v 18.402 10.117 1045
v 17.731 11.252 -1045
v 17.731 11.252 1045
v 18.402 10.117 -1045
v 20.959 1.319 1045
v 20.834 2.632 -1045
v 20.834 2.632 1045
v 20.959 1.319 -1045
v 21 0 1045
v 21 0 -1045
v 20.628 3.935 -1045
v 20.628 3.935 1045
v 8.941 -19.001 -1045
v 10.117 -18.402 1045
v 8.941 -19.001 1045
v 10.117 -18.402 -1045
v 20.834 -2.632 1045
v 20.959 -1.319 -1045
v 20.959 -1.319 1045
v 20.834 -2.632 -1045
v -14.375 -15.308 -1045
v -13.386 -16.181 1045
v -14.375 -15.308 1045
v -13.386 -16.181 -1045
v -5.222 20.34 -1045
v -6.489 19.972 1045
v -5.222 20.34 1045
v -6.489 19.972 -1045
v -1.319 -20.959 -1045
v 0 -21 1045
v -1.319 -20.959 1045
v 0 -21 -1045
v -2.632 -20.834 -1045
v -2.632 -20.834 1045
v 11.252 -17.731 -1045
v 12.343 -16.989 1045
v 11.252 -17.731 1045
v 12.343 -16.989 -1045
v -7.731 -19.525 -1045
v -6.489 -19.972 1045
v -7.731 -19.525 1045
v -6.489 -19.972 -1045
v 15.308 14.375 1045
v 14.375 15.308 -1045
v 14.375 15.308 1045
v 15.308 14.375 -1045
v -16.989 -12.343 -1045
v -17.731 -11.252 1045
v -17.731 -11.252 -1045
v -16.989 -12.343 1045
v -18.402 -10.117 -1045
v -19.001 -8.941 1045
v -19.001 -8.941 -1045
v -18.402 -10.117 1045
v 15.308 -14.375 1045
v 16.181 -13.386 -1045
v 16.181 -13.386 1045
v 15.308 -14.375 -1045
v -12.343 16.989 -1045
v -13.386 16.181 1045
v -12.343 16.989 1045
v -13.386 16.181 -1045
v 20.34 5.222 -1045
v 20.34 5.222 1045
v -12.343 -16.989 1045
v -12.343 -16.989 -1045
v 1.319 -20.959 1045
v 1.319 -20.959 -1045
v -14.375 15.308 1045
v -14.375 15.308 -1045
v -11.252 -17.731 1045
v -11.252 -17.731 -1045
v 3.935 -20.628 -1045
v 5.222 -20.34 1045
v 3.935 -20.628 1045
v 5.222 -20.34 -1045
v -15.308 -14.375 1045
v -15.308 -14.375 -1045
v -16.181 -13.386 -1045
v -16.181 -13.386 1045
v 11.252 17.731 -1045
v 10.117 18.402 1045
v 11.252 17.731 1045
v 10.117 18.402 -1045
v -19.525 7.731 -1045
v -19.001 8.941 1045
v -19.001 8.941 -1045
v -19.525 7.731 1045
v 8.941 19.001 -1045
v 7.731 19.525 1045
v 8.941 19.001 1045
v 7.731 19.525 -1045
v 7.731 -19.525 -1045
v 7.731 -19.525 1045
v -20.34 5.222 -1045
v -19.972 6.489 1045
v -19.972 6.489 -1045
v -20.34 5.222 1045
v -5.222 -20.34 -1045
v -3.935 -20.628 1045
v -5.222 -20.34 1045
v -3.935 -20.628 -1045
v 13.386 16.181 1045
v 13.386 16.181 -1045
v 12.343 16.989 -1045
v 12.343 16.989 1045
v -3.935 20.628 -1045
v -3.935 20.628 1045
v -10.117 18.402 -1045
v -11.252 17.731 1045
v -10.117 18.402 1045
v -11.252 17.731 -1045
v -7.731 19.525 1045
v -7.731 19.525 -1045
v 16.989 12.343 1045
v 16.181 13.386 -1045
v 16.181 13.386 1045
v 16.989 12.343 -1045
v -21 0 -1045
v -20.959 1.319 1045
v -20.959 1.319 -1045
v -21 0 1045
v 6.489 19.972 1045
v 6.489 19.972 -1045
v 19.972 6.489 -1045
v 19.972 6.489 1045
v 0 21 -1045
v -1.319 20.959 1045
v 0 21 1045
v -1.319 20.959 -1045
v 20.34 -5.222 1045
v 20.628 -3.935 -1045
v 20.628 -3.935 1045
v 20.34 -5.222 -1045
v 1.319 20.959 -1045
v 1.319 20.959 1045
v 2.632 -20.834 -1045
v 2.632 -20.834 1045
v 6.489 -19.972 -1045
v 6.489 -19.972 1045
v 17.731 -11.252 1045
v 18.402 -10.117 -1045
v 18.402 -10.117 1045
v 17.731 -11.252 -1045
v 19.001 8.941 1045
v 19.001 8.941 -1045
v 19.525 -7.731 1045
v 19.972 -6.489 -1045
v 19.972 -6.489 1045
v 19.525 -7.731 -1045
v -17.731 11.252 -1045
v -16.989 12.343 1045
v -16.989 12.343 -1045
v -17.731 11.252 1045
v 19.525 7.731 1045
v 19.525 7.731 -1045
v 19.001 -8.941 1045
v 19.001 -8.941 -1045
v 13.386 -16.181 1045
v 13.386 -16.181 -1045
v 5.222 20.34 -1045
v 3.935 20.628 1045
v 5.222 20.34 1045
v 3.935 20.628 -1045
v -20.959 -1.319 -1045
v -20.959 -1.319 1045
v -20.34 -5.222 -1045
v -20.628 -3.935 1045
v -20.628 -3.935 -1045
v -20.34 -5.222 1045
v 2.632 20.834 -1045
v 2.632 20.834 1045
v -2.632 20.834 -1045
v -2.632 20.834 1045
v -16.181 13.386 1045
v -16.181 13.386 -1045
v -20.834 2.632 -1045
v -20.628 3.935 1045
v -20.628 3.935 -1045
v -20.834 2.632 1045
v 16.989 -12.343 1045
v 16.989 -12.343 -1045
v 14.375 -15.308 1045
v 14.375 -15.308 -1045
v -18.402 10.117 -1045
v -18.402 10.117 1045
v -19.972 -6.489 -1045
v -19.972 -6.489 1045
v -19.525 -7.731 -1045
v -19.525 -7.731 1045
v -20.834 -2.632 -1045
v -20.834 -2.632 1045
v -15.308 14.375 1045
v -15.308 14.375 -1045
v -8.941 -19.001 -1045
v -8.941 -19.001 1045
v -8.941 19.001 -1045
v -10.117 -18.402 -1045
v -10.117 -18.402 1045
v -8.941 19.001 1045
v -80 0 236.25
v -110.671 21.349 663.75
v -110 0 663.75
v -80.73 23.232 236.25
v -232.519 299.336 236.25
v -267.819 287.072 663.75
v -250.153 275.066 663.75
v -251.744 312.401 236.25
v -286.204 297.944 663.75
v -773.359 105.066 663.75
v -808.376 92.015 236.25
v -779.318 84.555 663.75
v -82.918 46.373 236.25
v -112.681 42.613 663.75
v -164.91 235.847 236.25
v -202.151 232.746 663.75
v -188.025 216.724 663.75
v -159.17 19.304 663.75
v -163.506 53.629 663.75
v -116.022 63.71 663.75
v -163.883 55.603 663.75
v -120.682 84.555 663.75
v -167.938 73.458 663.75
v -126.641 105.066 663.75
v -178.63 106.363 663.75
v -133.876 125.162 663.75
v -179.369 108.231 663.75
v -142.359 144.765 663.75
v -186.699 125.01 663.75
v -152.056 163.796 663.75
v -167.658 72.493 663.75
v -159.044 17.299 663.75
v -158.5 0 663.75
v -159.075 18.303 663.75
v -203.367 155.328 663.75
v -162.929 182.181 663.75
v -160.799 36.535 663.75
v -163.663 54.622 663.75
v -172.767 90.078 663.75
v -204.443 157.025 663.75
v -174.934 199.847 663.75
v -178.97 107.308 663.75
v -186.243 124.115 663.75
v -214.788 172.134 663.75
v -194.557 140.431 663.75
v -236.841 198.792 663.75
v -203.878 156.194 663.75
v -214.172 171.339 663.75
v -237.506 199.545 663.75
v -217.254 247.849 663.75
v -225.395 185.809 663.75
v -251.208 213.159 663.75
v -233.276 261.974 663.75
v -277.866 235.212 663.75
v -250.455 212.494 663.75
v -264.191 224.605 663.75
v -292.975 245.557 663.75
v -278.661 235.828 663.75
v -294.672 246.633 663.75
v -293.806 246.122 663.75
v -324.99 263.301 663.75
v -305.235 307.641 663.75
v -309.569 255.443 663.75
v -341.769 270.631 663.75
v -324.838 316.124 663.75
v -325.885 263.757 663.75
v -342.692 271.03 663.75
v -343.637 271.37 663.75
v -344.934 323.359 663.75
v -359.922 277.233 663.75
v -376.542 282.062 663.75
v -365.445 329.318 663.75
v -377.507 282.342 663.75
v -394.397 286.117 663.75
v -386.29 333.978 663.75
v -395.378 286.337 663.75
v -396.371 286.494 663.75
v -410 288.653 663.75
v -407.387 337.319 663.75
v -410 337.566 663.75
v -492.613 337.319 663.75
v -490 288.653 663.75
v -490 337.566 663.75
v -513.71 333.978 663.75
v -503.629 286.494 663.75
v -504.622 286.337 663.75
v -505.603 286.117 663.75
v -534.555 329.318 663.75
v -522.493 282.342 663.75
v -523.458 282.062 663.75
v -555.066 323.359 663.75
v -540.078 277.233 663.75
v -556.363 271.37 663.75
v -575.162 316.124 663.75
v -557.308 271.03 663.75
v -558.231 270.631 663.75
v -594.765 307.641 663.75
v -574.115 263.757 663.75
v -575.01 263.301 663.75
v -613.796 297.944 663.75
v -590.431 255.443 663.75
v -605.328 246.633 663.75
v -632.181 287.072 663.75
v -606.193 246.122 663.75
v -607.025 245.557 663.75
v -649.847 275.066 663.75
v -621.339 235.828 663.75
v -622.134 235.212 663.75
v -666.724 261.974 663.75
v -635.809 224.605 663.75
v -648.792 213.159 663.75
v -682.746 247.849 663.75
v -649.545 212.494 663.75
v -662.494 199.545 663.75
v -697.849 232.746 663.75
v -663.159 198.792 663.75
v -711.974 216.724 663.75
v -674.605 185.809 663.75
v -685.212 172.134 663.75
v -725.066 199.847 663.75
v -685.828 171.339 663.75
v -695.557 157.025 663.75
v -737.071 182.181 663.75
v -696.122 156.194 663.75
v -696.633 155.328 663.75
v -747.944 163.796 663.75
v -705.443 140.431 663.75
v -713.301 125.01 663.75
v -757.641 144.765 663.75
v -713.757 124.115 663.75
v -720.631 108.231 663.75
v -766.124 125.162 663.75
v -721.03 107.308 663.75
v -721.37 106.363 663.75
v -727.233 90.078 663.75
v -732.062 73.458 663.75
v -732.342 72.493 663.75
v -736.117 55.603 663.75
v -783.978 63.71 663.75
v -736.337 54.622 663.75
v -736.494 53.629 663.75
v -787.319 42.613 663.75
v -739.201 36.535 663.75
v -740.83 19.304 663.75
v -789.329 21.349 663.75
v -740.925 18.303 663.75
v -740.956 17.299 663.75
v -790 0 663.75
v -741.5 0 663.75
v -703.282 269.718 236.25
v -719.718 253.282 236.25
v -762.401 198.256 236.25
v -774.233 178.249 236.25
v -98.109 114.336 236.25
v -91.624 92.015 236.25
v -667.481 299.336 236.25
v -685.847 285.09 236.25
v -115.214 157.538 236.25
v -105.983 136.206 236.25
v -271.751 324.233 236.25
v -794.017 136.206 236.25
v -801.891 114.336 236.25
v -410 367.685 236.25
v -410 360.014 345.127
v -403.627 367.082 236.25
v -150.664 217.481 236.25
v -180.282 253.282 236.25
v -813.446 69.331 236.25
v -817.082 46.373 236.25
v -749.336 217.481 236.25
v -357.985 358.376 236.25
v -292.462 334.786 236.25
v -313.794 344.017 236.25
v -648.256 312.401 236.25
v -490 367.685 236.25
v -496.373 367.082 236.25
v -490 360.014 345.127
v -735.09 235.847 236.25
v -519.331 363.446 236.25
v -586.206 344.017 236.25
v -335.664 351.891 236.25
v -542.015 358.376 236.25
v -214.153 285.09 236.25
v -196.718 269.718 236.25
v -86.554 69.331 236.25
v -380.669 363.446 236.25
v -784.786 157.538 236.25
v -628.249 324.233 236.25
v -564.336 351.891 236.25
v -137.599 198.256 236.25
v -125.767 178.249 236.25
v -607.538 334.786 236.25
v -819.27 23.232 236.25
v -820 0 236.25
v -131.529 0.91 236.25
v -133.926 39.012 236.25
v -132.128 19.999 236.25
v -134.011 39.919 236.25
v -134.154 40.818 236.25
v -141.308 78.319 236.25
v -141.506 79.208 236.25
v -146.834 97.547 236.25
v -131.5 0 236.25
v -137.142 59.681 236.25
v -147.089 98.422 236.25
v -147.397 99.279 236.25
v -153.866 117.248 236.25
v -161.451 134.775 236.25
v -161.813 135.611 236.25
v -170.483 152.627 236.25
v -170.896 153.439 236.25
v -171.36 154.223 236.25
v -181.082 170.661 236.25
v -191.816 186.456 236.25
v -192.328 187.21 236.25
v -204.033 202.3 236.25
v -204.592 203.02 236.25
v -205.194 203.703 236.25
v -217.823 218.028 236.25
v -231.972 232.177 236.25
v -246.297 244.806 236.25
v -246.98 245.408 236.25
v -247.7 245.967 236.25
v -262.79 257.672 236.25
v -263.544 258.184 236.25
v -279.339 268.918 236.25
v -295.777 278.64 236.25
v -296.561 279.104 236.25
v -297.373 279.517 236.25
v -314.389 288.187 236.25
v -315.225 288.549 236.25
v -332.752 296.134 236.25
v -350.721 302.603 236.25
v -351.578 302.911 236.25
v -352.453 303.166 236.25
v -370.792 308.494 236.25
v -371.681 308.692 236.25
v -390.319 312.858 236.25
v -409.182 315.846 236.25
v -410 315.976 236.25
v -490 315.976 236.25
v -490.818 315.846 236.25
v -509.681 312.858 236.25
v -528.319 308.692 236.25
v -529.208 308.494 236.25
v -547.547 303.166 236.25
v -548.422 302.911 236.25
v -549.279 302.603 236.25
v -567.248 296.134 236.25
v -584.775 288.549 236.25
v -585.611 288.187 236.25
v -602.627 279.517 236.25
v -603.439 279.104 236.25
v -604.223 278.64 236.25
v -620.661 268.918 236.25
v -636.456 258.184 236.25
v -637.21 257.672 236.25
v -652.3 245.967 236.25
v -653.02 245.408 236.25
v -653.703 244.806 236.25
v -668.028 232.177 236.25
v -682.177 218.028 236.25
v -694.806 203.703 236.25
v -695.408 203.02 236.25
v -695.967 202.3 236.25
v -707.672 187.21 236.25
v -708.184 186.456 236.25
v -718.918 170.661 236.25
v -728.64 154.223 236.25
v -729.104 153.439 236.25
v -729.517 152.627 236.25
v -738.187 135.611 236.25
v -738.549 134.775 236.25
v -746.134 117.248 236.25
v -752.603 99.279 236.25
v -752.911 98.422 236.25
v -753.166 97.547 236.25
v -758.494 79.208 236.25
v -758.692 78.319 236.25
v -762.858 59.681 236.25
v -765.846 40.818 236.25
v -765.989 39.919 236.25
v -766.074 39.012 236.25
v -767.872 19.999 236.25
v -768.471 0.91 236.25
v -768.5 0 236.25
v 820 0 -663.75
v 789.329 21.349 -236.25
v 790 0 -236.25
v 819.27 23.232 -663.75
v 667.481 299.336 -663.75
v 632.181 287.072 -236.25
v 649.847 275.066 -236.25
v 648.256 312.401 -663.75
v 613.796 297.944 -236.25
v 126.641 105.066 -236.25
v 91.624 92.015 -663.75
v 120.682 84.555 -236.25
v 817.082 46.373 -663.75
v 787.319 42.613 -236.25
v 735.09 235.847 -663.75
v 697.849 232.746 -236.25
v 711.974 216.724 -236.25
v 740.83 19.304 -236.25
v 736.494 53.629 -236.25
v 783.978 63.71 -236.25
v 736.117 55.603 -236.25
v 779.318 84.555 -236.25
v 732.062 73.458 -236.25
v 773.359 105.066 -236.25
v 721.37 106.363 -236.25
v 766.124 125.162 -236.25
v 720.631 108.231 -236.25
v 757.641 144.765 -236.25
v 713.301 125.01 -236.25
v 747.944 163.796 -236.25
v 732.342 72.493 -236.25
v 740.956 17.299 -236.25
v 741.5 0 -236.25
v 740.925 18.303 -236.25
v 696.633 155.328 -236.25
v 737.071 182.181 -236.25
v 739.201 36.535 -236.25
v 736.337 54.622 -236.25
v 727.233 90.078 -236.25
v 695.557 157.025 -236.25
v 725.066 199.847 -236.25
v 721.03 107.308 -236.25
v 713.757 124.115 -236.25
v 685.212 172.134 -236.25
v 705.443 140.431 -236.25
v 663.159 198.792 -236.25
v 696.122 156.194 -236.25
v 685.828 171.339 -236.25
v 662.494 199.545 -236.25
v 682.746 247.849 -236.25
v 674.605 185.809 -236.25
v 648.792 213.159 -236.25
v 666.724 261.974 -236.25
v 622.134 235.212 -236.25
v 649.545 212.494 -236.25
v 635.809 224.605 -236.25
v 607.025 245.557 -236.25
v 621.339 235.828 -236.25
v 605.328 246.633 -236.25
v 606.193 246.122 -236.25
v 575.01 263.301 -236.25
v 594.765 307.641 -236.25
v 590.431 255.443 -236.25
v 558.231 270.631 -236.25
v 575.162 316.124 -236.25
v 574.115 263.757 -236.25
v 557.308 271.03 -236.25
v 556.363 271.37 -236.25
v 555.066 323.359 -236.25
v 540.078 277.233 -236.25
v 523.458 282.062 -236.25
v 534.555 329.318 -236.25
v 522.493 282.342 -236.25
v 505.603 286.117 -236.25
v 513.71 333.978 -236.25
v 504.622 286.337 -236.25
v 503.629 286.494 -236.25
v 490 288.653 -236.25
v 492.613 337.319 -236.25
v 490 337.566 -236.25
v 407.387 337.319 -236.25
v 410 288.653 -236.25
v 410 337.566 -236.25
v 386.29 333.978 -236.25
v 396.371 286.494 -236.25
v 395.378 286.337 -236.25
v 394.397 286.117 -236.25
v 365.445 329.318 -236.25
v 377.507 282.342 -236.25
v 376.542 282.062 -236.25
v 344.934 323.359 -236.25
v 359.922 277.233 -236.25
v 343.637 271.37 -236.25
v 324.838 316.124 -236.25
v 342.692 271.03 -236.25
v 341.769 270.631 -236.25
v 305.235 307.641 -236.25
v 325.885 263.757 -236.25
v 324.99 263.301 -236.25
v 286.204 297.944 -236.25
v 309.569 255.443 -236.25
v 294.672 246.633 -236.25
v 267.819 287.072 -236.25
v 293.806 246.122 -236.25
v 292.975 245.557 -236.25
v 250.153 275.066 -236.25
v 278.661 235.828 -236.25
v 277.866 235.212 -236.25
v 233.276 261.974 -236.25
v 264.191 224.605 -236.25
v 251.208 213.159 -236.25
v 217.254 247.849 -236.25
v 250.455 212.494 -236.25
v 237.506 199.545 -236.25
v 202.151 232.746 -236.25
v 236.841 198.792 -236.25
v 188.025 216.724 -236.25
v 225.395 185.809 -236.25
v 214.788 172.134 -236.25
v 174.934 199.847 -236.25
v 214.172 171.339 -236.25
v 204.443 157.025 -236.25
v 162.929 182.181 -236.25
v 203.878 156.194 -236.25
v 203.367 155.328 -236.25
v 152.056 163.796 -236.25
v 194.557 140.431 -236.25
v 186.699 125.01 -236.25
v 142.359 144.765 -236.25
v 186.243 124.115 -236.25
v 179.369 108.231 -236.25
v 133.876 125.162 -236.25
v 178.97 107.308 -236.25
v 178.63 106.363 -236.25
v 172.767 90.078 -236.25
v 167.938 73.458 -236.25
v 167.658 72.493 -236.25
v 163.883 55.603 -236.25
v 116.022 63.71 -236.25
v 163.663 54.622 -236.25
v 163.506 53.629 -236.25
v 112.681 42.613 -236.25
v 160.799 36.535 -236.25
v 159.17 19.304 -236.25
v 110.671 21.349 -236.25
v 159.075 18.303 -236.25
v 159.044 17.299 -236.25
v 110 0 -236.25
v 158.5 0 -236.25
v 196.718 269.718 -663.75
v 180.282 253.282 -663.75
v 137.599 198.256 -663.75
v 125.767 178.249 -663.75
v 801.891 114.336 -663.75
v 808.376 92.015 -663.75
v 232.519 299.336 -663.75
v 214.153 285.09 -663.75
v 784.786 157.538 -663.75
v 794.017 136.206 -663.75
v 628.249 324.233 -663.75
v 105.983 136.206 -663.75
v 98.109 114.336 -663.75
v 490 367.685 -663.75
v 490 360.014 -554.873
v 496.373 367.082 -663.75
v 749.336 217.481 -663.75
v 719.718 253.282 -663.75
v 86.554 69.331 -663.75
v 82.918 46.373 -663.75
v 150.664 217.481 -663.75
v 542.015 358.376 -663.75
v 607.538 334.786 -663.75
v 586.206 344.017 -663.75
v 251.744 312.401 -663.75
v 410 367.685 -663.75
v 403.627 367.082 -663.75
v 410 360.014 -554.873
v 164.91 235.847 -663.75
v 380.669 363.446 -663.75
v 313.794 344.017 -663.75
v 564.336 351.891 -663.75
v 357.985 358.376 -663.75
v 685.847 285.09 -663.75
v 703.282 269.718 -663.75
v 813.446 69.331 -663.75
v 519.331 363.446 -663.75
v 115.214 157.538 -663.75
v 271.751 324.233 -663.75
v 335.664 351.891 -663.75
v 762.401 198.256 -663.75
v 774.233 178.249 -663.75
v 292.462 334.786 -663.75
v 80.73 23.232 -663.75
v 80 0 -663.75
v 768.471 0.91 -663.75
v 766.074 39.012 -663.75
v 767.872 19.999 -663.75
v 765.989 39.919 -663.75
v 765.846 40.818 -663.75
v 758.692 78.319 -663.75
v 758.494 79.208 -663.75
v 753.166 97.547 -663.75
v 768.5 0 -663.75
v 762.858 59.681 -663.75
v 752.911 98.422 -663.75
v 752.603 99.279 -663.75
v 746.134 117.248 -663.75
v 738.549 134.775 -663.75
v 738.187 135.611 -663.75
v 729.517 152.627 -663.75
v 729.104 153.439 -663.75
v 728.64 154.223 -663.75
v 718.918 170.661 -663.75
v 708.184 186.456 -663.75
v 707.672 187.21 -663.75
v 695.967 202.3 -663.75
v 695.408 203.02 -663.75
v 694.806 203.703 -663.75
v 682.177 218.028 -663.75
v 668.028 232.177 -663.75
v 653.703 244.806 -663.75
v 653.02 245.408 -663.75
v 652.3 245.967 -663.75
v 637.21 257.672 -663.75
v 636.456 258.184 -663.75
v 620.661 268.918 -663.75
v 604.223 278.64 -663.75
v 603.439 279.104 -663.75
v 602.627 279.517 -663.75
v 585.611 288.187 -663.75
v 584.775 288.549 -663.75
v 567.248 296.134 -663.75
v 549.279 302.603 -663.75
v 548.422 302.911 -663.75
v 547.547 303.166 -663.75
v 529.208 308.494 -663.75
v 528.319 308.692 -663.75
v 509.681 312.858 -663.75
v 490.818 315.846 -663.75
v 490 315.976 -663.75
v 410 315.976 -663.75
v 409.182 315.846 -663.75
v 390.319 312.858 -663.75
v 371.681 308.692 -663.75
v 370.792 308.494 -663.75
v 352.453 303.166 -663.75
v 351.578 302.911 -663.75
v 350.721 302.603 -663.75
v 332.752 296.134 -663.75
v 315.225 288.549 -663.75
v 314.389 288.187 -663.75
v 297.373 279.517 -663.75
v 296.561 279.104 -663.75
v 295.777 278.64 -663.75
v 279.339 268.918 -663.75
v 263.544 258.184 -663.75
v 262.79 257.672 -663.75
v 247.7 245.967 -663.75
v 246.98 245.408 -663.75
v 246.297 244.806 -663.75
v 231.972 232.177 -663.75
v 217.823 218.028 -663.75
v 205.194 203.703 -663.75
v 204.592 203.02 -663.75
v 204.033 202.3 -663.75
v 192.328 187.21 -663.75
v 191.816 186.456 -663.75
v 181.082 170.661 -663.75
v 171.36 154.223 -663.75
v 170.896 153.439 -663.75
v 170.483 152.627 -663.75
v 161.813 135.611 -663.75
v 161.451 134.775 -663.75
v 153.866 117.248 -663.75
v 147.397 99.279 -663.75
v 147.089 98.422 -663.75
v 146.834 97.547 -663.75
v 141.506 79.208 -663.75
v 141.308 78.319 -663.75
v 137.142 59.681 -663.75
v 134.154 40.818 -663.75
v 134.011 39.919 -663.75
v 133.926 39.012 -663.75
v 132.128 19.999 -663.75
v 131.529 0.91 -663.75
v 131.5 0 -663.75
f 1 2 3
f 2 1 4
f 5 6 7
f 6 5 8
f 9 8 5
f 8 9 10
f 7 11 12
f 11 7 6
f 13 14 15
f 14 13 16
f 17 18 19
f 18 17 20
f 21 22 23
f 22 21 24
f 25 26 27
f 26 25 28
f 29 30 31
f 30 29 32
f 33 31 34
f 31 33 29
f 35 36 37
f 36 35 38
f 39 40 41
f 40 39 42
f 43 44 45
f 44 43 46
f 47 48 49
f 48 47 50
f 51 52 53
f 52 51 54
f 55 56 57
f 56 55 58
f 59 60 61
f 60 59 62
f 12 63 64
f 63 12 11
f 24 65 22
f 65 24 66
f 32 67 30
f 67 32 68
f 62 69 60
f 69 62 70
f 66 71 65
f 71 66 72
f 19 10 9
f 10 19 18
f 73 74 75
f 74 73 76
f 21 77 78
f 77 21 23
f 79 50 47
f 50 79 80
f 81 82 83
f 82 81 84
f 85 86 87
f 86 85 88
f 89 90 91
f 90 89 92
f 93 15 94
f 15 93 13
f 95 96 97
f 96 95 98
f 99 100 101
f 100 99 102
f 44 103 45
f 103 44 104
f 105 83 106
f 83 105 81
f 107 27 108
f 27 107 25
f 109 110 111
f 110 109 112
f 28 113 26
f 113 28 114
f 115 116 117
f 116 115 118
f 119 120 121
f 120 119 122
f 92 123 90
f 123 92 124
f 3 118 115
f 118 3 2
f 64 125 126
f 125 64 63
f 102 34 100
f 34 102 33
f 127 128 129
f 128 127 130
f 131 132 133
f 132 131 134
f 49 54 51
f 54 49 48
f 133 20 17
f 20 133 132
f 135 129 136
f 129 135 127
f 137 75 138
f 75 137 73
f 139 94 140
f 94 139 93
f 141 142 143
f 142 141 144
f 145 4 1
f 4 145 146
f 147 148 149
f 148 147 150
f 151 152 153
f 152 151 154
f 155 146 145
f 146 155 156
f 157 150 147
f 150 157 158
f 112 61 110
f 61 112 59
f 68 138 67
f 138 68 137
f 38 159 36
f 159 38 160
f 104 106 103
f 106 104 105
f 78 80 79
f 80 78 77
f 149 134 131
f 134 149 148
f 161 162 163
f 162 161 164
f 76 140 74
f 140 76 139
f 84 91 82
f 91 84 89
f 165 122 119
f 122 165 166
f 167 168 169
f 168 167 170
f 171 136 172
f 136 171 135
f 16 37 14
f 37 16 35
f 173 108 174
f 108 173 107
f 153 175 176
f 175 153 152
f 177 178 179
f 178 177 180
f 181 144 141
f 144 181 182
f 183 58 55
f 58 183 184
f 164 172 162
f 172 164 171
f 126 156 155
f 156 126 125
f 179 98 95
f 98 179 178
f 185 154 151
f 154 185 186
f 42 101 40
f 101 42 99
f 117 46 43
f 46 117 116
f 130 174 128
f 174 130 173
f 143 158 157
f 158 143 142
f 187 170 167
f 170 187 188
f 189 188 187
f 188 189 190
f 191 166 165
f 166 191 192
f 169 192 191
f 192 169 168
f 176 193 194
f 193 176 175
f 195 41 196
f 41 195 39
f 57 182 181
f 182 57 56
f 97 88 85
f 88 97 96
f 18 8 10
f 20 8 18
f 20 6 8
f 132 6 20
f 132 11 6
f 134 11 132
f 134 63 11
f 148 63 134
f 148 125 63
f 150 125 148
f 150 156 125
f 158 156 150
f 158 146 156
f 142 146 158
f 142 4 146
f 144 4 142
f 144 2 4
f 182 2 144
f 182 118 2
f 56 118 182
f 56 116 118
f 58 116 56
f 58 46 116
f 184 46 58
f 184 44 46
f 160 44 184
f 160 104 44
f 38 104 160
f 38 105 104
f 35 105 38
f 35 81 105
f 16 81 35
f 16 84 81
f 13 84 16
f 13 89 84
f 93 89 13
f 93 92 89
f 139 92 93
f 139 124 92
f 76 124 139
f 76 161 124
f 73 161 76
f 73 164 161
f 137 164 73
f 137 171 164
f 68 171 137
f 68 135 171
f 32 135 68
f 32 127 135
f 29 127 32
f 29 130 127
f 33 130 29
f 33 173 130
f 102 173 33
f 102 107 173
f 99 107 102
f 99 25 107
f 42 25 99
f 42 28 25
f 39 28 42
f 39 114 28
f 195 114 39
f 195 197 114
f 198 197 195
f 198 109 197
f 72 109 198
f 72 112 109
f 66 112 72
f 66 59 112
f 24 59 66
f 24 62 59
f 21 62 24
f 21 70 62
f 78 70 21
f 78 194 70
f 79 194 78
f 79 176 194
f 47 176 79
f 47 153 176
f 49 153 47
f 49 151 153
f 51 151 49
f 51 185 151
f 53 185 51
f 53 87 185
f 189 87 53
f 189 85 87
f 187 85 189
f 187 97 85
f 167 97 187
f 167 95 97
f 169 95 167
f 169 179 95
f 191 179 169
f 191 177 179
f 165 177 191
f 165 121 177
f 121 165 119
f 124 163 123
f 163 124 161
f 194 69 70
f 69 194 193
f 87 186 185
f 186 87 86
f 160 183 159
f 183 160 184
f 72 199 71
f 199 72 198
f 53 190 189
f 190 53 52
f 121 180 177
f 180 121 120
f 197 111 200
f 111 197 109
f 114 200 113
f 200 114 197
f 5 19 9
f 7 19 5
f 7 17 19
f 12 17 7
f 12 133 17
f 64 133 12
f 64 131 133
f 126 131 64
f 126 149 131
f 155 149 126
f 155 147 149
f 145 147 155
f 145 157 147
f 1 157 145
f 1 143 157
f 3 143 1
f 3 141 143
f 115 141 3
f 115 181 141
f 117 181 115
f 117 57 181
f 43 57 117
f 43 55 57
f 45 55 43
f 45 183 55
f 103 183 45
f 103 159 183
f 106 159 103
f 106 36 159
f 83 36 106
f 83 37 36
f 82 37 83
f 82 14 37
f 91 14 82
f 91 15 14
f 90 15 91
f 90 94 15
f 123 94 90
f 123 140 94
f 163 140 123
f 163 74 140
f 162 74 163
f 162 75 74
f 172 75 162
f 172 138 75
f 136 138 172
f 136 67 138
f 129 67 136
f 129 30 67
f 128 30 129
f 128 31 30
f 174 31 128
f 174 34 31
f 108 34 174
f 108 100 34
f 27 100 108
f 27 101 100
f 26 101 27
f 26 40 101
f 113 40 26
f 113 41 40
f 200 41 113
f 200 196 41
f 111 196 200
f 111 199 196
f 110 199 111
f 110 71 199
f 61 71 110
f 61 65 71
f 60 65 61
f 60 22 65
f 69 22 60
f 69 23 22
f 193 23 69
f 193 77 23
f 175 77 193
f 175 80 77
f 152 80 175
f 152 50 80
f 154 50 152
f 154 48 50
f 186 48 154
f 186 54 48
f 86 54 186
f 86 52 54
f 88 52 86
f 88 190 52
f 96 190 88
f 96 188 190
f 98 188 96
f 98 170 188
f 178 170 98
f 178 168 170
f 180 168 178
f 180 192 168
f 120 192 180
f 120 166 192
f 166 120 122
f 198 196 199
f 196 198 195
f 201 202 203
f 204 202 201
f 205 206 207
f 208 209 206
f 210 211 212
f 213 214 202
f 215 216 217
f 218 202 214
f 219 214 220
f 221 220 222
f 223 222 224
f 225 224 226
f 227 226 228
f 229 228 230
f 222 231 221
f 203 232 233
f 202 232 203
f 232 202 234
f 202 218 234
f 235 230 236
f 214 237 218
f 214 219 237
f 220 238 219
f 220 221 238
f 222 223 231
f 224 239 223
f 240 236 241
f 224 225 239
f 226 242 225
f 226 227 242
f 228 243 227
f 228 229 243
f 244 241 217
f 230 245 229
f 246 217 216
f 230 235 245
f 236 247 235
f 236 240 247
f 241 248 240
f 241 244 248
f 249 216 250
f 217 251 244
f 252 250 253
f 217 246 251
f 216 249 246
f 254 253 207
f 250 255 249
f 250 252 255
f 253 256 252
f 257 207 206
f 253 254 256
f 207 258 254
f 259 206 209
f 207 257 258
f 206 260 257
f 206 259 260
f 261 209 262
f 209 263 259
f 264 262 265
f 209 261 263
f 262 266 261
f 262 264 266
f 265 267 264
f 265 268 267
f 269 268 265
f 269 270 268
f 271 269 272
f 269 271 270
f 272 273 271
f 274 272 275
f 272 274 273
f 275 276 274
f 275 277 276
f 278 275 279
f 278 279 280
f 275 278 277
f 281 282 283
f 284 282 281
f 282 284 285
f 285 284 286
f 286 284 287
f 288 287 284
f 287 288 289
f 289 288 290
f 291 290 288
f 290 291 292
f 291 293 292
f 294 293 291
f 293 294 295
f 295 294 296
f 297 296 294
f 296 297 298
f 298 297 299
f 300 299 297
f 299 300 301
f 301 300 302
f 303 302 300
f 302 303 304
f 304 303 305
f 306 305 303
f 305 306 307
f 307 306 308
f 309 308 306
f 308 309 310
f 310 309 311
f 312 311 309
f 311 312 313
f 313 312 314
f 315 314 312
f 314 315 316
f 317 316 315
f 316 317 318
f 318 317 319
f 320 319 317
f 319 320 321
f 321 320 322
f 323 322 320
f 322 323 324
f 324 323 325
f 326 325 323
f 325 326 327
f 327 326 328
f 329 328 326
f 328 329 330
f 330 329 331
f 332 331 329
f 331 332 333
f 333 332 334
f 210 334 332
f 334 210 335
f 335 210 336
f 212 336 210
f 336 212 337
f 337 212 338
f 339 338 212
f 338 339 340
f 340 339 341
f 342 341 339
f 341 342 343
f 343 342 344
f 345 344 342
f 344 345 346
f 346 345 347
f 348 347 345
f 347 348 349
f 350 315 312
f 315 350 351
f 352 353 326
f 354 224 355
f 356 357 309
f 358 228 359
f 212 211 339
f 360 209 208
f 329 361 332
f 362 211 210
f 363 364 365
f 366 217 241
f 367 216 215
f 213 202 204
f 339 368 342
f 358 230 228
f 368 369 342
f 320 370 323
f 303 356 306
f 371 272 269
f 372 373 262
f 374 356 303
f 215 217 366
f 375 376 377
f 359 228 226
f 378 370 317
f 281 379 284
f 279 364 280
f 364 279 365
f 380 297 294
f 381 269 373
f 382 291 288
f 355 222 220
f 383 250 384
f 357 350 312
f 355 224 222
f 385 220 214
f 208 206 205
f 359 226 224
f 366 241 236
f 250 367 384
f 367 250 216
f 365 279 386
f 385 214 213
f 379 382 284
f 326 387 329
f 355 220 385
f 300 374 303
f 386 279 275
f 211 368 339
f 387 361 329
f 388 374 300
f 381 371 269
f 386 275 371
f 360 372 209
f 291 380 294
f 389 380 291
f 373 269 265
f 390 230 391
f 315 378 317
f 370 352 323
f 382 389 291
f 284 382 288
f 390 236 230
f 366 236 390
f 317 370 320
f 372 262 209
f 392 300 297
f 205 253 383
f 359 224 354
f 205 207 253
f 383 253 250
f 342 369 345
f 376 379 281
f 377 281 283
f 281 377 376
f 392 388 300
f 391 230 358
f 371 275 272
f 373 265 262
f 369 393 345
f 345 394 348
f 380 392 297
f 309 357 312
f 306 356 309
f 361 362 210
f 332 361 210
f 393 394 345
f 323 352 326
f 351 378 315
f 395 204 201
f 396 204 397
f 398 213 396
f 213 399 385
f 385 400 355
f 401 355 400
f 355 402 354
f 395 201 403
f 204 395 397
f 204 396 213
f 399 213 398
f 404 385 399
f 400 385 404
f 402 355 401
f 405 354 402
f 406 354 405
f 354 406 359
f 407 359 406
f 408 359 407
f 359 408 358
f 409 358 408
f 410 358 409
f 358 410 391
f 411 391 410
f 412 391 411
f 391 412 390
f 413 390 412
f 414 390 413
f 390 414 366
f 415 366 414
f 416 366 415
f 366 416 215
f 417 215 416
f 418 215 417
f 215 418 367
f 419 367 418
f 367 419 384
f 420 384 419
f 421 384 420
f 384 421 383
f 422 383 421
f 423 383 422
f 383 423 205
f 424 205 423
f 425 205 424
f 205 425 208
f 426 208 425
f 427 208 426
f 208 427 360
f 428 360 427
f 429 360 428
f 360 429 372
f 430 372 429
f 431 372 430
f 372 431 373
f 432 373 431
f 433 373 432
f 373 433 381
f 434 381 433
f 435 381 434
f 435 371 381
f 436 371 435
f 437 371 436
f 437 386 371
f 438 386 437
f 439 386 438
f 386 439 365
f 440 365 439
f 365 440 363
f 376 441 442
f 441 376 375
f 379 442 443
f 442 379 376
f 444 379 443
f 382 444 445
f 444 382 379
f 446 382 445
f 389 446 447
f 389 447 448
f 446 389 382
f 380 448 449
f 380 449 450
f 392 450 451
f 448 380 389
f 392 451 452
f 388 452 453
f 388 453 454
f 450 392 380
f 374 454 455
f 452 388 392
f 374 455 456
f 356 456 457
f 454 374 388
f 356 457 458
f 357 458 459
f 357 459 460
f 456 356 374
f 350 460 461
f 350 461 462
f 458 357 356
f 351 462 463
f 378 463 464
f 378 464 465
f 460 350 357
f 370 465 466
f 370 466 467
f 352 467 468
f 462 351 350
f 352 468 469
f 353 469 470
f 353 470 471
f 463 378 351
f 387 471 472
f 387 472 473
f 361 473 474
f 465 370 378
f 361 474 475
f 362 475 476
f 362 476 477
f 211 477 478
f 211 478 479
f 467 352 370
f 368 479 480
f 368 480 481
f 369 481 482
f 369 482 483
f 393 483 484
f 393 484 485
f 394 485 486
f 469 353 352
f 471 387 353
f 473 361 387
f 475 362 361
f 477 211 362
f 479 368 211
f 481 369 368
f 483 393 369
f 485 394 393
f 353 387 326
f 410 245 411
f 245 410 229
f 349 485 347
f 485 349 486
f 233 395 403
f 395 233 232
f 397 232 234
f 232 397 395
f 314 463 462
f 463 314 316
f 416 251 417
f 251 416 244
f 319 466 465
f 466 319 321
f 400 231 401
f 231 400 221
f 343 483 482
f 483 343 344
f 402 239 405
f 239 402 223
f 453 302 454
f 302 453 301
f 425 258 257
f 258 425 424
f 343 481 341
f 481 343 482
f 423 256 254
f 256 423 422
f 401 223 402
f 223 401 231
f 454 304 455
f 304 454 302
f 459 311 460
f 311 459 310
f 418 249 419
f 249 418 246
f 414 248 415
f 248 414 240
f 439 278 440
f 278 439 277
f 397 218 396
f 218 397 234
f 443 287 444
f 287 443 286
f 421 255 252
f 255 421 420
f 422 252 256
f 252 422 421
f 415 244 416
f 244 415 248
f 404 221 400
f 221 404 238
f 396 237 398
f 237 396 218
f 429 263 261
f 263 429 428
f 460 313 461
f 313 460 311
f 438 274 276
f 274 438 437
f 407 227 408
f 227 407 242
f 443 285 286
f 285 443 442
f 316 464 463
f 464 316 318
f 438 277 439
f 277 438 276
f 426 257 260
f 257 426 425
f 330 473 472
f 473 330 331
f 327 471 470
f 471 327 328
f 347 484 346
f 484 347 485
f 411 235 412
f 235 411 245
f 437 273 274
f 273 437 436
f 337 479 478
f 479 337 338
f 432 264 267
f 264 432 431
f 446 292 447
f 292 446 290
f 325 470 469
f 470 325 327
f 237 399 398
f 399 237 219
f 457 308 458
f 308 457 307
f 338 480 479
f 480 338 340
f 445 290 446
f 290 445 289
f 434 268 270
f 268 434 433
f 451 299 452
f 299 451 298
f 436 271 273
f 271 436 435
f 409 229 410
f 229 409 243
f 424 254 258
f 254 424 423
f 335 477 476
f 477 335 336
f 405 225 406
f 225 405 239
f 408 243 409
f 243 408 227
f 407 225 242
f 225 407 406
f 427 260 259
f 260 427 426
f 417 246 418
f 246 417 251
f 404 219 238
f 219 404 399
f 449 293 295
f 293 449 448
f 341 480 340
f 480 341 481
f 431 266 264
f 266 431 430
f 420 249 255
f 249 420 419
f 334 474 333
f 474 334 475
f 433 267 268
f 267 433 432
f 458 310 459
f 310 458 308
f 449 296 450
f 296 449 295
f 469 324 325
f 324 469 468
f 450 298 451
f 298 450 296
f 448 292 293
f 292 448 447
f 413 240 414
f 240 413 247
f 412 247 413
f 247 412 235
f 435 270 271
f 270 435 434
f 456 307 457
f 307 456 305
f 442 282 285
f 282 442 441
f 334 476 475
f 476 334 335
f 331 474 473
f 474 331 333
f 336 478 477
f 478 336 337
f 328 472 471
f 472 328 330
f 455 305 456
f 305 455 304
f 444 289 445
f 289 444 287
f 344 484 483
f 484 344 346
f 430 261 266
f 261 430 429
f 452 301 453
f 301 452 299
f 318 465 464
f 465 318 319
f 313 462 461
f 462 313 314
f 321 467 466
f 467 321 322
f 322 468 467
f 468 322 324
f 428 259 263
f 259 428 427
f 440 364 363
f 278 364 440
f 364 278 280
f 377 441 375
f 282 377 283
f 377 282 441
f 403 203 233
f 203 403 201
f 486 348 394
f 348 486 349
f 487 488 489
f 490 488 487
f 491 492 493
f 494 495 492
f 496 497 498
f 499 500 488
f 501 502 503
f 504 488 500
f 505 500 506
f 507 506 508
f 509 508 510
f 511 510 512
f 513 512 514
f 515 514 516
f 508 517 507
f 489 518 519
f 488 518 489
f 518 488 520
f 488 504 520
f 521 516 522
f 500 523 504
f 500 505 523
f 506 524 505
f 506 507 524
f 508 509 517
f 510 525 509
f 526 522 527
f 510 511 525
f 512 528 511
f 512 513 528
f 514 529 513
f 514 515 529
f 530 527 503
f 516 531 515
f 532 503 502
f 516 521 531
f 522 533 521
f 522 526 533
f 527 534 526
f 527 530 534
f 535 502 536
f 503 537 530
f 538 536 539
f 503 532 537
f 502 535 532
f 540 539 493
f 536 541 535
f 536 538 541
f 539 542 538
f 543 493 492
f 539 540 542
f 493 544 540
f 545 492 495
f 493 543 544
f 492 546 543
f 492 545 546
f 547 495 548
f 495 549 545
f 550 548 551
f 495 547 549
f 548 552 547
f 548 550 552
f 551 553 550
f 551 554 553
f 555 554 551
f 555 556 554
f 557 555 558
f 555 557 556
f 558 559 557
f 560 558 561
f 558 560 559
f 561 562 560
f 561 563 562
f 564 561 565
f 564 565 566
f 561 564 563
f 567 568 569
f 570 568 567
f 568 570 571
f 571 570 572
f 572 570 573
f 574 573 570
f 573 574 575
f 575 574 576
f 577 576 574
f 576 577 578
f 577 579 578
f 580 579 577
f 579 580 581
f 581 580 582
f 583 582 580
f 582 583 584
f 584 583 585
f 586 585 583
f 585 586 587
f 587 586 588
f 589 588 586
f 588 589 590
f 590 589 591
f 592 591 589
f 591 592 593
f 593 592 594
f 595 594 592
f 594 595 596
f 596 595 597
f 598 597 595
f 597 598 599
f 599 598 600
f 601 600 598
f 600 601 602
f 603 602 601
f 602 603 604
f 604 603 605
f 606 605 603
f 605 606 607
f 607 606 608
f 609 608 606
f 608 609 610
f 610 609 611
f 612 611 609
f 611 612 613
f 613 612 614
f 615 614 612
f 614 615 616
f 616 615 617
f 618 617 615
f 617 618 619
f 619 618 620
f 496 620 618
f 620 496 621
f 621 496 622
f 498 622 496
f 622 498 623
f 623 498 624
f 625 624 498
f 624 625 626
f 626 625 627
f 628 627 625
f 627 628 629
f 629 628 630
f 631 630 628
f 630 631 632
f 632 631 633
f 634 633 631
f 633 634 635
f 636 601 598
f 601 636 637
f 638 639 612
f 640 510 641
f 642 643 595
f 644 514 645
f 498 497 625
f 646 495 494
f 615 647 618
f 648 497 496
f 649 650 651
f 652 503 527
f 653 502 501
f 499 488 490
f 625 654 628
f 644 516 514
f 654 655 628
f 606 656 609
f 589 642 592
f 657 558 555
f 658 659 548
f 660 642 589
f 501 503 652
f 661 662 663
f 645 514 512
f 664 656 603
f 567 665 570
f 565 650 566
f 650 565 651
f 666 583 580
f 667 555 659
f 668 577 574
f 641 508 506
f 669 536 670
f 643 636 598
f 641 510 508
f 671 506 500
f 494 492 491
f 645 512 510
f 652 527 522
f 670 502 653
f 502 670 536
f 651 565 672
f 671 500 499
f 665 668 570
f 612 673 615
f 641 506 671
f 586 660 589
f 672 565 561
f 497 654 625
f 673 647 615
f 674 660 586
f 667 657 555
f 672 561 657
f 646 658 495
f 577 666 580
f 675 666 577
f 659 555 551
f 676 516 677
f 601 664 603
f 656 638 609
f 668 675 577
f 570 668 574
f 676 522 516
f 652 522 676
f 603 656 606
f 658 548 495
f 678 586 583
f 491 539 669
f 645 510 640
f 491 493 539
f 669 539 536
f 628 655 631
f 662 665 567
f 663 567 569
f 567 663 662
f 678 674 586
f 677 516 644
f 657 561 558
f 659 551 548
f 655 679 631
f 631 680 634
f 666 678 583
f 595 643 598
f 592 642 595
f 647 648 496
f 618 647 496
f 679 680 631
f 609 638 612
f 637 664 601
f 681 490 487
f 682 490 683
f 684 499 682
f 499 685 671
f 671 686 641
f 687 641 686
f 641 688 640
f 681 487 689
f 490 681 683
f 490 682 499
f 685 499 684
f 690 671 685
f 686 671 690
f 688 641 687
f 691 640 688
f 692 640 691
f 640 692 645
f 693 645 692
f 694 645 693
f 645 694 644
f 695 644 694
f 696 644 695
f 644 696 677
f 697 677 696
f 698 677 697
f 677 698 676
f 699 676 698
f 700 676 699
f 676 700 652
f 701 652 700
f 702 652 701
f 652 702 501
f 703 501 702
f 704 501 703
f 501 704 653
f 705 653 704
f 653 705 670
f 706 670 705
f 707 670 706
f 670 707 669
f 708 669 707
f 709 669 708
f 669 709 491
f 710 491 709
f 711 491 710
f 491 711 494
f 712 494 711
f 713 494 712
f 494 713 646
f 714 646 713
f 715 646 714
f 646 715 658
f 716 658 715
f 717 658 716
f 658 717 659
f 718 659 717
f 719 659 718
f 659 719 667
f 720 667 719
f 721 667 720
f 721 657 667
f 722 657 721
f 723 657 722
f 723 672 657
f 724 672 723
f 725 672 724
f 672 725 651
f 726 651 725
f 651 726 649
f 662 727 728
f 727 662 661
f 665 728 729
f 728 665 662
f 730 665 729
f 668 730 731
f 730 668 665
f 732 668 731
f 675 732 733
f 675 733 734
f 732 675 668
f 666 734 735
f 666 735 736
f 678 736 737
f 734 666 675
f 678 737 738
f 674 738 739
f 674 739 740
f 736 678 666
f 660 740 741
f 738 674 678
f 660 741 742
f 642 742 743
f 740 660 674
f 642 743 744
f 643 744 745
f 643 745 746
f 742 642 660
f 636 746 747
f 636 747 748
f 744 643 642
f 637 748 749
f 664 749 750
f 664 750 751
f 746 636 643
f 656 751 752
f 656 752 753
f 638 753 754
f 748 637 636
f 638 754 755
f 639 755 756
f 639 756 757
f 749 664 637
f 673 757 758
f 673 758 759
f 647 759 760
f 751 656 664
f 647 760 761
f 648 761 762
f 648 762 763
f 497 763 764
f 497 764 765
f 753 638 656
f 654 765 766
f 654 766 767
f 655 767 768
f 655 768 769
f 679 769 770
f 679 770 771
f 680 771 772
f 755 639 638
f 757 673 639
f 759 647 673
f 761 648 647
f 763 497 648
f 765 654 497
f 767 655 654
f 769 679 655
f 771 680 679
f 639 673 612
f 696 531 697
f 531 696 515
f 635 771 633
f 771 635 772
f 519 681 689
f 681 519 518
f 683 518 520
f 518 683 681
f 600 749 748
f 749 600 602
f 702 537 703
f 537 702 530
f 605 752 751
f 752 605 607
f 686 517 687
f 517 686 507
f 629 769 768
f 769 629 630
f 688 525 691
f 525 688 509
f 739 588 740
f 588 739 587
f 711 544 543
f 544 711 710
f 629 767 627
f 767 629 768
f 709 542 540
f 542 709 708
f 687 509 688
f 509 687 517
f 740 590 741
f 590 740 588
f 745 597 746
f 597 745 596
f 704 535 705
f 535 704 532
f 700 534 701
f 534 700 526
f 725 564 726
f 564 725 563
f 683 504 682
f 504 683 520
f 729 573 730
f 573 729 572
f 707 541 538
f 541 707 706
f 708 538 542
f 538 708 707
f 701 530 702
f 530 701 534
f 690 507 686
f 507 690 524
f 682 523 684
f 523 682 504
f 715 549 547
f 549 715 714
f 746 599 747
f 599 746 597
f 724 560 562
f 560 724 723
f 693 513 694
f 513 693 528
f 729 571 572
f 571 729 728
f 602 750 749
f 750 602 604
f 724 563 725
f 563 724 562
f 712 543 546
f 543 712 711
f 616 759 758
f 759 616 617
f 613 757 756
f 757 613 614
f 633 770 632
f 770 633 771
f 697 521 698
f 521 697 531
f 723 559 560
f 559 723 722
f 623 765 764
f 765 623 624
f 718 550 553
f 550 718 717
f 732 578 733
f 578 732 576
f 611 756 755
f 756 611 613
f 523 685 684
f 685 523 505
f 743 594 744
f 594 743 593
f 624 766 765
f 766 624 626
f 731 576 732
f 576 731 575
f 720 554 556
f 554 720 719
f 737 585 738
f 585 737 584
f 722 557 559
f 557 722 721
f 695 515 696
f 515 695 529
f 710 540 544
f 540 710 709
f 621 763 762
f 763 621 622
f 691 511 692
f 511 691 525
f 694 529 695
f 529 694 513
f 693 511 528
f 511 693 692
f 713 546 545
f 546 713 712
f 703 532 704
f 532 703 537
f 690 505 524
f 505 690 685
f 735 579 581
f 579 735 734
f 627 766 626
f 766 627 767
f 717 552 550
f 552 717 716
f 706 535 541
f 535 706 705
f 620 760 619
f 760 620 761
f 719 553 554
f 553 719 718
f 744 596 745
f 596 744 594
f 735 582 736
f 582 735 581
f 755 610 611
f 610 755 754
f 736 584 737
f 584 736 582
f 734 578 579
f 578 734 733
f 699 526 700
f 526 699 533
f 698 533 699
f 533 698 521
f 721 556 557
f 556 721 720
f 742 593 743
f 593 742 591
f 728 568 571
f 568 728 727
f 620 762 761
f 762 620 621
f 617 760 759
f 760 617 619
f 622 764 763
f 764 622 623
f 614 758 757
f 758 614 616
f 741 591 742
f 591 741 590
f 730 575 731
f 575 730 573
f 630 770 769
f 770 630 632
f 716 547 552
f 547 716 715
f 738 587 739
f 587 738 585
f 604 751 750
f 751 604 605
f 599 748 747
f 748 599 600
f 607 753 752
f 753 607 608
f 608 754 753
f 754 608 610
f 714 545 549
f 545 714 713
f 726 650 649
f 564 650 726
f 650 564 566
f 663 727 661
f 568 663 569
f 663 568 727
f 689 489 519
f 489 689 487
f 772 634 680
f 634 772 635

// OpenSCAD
// ============================================================================
// PROJECT: XXXG-00W0 WING GUNDAM ZERO EW - LOWER airframe DEFENSE MATRIX
// COMPONENT VAULT: BANDAI CAST RUNNER B - HIP SHIELDS B26 & B27
// MANUFACTURING SPEC: WIRELESS INDUCTIVE HARNESS PROXIMITY TERMINALS
// DESIGN SPECS: 5,200 Nm HIP TORQUE LOOPS & DLC LOW-FRICTION SLIDERS
// ============================================================================

$fn = 100; // Circular segment rendering resolution count

// Structural Constants Scaled 1:1 for a 16.7-Meter Airframe Scale (mm)
hip_shield_length = 950;                // Total longitudinal vertical height (mm)
hip_outer_diameter = 680;               // Transverse shell casing envelope width (mm)
armor_skin_thickness = 50;              // Solid TiAl protective plating wall (mm)
harness_conduit_width = 80;             // Cast-in 4oz copper logic trace track (mm)

module Runner_B_Hip_Shield_Forge() {
    // Central Supply Injection Runner Axis (Molten Feed Line from Siphon Forge)
    color([0.22, 0.22, 0.24]) {
        cylinder(h = hip_shield_length * 2.2, d = 42, center = true);
        // Direct injection gates tracking straight into the part mold cavities
        translate() rotate() cylinder(h = 450, d = 22);
        translate([0, 0, -450]) rotate() cylinder(h = 450, d = 22);
    }
    
    // Instantiate Scaled Skeutomorphic Part Molds Symmetrically
    Cast_Outer_Hip_Armor_Shells();
}

module Cast_Outer_Hip_Armor_Shells() {
    // ---- PART B26: LEFT THIGH EXTERIOR ADAPTER SHIELD ---- [Page 6, Step 2 / Page 6, Step 05-2]
    translate([-450, 0, 450]) color([0.85, 0.85, 0.9]) { // Classic White Armor Spec
        difference() {
            // Main cylindrical contoured hip protective panel casing
            cylinder(h = hip_shield_length * 0.45, d1 = hip_outer_diameter + 60, d2 = hip_outer_diameter, center = true);
            
            // Internal pocket excavation (Leaves the rigid 50mm protective boundary)
            cylinder(h = hip_shield_length * 0.5, d1 = hip_outer_diameter + 60 - (armor_skin_thickness*2), d2 = hip_outer_diameter - (armor_skin_thickness*2), center = true);
            
            // Continuous cast-in routing track for the 4oz solid-state wiring rails
            cube([harness_conduit_width, hip_outer_diameter + 80, hip_shield_length], center = true);
            
            // Slicing profile tool to generate an asymmetrical half-shell part component
            translate([0, -hip_outer_diameter, 0])
                cube([hip_outer_diameter * 2, hip_outer_diameter * 2, hip_shield_length * 2], center = true);
        }
    }
    
    // ---- PART B27: RIGHT THIGH EXTERIOR ADAPTER SHIELD ---- [Page 6, Step 1 / Page 6, Step 05-2]
    translate([450, 0, -450]) rotate() color([0.85, 0.85, 0.9]) {
        difference() {
            cylinder(h = hip_shield_length * 0.45, d1 = hip_outer_diameter + 60, d2 = hip_outer_diameter, center = true);
            cylinder(h = hip_shield_length * 0.5, d1 = hip_outer_diameter + 60 - (armor_skin_thickness*2), d2 = hip_outer_diameter - (armor_skin_thickness*2), center = true);
            cube([harness_conduit_width, hip_outer_diameter + 80, hip_shield_length], center = true);
            translate([0, -hip_outer_diameter, 0])
                cube([hip_outer_diameter * 2, hip_outer_diameter * 2, hip_shield_length * 2], center = true);
        }
    }
}

// Render Master Assembly to Parameter Workspace
Runner_B_Hip_Shield_Forge();
